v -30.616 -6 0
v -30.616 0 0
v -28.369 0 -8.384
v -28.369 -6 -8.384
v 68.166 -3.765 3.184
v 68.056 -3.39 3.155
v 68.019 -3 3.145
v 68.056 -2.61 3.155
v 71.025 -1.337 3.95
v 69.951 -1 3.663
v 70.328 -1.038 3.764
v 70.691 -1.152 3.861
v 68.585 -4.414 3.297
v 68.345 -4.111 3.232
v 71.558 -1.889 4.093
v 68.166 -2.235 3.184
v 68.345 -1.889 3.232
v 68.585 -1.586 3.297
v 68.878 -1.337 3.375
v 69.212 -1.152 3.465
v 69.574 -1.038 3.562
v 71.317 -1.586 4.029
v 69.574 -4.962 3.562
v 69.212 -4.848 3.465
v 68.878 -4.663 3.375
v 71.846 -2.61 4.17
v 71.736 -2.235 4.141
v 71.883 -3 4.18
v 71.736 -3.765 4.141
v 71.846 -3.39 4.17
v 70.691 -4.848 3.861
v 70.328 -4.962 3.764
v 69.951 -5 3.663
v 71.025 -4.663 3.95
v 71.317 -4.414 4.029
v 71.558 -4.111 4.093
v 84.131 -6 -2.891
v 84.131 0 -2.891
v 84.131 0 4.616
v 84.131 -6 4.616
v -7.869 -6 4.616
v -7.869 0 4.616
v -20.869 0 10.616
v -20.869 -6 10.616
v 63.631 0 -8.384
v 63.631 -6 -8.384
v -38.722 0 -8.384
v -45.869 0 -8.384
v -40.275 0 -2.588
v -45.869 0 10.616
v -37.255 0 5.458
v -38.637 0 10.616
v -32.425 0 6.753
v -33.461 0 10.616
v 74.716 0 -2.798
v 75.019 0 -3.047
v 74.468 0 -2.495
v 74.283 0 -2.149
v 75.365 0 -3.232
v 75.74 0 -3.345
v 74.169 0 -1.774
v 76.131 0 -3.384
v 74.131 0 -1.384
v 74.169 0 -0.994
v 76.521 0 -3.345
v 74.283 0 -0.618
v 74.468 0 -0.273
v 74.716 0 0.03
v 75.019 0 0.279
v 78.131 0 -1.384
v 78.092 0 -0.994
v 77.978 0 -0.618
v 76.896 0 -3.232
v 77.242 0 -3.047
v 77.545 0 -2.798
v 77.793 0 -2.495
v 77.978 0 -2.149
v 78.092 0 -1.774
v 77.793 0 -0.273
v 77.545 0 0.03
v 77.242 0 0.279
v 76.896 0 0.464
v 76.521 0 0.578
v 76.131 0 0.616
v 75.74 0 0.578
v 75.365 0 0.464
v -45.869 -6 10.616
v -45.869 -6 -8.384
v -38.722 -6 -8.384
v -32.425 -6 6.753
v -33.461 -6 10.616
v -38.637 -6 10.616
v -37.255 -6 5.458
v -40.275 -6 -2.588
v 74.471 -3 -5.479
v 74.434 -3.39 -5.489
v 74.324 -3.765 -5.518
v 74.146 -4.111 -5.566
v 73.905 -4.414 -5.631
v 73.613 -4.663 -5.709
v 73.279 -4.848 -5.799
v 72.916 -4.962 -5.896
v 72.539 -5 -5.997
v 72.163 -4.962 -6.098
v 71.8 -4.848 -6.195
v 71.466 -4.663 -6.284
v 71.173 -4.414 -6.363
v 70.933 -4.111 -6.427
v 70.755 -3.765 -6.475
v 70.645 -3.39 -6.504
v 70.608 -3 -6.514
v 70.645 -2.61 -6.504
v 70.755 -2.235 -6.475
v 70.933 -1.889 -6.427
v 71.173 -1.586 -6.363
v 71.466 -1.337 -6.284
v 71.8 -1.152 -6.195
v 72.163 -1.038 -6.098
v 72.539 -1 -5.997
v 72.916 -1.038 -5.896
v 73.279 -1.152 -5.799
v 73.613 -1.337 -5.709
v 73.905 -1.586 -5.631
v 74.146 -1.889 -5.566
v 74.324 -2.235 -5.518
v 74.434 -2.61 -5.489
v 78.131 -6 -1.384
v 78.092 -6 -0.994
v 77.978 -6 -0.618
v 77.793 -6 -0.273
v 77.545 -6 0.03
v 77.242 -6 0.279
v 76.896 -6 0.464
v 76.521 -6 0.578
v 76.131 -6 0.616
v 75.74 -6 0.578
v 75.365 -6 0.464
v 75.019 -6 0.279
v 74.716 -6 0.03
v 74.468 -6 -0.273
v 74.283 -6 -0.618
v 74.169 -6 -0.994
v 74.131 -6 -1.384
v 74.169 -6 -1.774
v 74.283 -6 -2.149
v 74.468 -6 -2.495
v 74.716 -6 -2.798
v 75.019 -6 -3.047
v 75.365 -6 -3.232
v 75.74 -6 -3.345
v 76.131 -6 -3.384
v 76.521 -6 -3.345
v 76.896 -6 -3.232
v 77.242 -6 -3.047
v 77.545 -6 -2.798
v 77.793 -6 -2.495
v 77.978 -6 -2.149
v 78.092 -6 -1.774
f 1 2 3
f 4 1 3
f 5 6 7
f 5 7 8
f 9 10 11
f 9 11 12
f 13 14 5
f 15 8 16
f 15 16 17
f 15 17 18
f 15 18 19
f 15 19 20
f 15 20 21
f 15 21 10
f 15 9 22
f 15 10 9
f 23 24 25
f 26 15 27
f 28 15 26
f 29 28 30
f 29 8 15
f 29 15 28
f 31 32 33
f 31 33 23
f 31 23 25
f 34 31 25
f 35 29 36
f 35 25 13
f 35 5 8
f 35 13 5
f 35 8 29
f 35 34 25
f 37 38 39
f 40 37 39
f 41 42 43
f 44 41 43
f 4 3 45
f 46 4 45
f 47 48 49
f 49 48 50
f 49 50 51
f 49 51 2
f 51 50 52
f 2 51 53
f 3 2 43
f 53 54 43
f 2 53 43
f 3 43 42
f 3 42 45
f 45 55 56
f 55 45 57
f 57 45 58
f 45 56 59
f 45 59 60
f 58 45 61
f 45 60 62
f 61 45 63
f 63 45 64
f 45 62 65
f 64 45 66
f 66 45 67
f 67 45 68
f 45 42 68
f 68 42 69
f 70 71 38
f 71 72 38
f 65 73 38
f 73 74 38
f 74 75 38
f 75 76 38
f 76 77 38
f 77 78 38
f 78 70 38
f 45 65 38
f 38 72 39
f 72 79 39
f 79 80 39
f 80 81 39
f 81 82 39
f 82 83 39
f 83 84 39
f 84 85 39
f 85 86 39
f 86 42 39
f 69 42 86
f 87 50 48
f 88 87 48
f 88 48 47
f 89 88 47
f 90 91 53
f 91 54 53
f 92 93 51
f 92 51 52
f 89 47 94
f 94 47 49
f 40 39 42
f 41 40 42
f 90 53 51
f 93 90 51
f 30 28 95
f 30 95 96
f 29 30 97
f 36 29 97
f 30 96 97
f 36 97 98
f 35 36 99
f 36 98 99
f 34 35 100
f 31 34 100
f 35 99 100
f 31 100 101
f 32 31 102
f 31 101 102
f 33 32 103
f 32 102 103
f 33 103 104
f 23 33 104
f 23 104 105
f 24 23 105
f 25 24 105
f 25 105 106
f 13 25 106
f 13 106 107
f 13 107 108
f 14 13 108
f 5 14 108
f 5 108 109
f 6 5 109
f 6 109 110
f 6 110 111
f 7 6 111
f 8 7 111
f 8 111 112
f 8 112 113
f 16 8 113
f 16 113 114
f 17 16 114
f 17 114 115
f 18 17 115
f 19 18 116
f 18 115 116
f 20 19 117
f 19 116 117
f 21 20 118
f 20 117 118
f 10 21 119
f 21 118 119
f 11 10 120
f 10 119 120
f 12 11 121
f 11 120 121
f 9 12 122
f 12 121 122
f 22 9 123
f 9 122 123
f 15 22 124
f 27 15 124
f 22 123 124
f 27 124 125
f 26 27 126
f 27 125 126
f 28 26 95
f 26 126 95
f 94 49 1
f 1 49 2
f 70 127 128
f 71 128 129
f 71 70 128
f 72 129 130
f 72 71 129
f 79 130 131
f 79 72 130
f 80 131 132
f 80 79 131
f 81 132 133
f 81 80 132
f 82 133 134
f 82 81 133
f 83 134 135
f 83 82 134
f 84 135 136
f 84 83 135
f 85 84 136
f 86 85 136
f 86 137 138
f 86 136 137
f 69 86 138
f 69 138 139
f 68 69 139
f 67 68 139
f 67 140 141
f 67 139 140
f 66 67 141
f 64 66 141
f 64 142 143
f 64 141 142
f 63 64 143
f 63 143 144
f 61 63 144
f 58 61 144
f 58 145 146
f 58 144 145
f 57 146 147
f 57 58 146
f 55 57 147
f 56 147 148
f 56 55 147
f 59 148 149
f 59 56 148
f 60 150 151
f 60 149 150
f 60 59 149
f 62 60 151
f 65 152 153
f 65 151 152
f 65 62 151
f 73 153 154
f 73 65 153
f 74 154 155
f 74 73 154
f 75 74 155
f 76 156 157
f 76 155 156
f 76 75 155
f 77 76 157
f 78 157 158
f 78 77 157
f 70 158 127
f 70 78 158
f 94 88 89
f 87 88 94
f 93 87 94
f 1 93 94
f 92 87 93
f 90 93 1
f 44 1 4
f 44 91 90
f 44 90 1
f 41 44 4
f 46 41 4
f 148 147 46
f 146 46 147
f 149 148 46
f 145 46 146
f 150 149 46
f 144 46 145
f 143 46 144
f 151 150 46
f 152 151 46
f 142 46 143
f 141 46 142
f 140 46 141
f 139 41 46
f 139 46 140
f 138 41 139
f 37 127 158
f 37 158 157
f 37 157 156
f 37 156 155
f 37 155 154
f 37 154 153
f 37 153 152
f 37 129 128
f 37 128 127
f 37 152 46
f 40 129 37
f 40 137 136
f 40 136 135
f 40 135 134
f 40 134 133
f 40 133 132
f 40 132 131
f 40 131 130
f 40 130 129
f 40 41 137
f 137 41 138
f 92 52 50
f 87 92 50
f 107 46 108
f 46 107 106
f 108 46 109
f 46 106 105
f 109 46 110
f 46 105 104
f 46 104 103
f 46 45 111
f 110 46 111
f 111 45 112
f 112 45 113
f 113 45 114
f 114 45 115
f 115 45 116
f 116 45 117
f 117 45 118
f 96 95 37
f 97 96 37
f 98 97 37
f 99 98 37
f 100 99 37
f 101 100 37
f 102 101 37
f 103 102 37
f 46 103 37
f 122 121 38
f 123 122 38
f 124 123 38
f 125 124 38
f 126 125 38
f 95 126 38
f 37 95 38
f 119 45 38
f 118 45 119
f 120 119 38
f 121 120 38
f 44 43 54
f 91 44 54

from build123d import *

# Parameters (mm, degrees)
F1_DEPTH = 6
F2_R     = 2
F3_DEPTH = 25
F4_R     = 2
F5_DEPTH = 10


with BuildPart() as f1:
    # F0 (on Front) → F1 (new body)
    with BuildSketch(Plane.XZ):
        Polygon((-38.636893, 10.616255), (-45.869478, 10.616255), (-45.869478, -8.383745), (-38.722239, -8.383745), (-40.275154, -2.58819), (-30.615895, 0), (-28.369478, -8.383745), (63.630522, -8.383745), (84.130522, -2.890787), (84.130522, 4.616255), (-7.869478, 4.616255), (-20.869478, 10.616255), (-33.460512, 10.616255), (-32.425236, 6.752551), (-37.254865, 5.458456), align=None)
    extrude(amount=F1_DEPTH)

    # F2 (on Front) + F1_face (on face) → F3 (cut)
    with BuildSketch(Plane.XZ):
        with Locations((76.130522, -1.383745)):
            Circle(F2_R)
    with BuildSketch(Plane(origin=(14.871895, -6, -0.728123), x_dir=(1, 0, 0), z_dir=(0, -1, 0))):
        Polygon((-52.12676, 6.186579), (-53.508788, 11.344377), (-60.741372, 11.344377), (-60.741372, -7.655623), (-53.594134, -7.655623), (-55.147048, -1.860068), (-45.48779, 0.728123), (-43.241372, -7.655623), (48.758628, -7.655623), (69.258628, -2.162664), (69.258628, 5.344377), (-22.741372, 5.344377), (-35.741372, 11.344377), (-48.332407, 11.344377), (-47.297131, 7.480674), align=None)
    extrude(amount=F3_DEPTH, mode=Mode.SUBTRACT)

    # F4 (on face) → F5 (cut)
    with BuildSketch(Plane(origin=(6.358373, 0, -23.729772), x_dir=(0.965926, 0, 0.258819), z_dir=(0.258819, 0, -0.965926))):
        with Locations((68.515654, 3)):
            Circle(F4_R)
    extrude(amount=-F5_DEPTH, mode=Mode.SUBTRACT)


solid = f1.part
